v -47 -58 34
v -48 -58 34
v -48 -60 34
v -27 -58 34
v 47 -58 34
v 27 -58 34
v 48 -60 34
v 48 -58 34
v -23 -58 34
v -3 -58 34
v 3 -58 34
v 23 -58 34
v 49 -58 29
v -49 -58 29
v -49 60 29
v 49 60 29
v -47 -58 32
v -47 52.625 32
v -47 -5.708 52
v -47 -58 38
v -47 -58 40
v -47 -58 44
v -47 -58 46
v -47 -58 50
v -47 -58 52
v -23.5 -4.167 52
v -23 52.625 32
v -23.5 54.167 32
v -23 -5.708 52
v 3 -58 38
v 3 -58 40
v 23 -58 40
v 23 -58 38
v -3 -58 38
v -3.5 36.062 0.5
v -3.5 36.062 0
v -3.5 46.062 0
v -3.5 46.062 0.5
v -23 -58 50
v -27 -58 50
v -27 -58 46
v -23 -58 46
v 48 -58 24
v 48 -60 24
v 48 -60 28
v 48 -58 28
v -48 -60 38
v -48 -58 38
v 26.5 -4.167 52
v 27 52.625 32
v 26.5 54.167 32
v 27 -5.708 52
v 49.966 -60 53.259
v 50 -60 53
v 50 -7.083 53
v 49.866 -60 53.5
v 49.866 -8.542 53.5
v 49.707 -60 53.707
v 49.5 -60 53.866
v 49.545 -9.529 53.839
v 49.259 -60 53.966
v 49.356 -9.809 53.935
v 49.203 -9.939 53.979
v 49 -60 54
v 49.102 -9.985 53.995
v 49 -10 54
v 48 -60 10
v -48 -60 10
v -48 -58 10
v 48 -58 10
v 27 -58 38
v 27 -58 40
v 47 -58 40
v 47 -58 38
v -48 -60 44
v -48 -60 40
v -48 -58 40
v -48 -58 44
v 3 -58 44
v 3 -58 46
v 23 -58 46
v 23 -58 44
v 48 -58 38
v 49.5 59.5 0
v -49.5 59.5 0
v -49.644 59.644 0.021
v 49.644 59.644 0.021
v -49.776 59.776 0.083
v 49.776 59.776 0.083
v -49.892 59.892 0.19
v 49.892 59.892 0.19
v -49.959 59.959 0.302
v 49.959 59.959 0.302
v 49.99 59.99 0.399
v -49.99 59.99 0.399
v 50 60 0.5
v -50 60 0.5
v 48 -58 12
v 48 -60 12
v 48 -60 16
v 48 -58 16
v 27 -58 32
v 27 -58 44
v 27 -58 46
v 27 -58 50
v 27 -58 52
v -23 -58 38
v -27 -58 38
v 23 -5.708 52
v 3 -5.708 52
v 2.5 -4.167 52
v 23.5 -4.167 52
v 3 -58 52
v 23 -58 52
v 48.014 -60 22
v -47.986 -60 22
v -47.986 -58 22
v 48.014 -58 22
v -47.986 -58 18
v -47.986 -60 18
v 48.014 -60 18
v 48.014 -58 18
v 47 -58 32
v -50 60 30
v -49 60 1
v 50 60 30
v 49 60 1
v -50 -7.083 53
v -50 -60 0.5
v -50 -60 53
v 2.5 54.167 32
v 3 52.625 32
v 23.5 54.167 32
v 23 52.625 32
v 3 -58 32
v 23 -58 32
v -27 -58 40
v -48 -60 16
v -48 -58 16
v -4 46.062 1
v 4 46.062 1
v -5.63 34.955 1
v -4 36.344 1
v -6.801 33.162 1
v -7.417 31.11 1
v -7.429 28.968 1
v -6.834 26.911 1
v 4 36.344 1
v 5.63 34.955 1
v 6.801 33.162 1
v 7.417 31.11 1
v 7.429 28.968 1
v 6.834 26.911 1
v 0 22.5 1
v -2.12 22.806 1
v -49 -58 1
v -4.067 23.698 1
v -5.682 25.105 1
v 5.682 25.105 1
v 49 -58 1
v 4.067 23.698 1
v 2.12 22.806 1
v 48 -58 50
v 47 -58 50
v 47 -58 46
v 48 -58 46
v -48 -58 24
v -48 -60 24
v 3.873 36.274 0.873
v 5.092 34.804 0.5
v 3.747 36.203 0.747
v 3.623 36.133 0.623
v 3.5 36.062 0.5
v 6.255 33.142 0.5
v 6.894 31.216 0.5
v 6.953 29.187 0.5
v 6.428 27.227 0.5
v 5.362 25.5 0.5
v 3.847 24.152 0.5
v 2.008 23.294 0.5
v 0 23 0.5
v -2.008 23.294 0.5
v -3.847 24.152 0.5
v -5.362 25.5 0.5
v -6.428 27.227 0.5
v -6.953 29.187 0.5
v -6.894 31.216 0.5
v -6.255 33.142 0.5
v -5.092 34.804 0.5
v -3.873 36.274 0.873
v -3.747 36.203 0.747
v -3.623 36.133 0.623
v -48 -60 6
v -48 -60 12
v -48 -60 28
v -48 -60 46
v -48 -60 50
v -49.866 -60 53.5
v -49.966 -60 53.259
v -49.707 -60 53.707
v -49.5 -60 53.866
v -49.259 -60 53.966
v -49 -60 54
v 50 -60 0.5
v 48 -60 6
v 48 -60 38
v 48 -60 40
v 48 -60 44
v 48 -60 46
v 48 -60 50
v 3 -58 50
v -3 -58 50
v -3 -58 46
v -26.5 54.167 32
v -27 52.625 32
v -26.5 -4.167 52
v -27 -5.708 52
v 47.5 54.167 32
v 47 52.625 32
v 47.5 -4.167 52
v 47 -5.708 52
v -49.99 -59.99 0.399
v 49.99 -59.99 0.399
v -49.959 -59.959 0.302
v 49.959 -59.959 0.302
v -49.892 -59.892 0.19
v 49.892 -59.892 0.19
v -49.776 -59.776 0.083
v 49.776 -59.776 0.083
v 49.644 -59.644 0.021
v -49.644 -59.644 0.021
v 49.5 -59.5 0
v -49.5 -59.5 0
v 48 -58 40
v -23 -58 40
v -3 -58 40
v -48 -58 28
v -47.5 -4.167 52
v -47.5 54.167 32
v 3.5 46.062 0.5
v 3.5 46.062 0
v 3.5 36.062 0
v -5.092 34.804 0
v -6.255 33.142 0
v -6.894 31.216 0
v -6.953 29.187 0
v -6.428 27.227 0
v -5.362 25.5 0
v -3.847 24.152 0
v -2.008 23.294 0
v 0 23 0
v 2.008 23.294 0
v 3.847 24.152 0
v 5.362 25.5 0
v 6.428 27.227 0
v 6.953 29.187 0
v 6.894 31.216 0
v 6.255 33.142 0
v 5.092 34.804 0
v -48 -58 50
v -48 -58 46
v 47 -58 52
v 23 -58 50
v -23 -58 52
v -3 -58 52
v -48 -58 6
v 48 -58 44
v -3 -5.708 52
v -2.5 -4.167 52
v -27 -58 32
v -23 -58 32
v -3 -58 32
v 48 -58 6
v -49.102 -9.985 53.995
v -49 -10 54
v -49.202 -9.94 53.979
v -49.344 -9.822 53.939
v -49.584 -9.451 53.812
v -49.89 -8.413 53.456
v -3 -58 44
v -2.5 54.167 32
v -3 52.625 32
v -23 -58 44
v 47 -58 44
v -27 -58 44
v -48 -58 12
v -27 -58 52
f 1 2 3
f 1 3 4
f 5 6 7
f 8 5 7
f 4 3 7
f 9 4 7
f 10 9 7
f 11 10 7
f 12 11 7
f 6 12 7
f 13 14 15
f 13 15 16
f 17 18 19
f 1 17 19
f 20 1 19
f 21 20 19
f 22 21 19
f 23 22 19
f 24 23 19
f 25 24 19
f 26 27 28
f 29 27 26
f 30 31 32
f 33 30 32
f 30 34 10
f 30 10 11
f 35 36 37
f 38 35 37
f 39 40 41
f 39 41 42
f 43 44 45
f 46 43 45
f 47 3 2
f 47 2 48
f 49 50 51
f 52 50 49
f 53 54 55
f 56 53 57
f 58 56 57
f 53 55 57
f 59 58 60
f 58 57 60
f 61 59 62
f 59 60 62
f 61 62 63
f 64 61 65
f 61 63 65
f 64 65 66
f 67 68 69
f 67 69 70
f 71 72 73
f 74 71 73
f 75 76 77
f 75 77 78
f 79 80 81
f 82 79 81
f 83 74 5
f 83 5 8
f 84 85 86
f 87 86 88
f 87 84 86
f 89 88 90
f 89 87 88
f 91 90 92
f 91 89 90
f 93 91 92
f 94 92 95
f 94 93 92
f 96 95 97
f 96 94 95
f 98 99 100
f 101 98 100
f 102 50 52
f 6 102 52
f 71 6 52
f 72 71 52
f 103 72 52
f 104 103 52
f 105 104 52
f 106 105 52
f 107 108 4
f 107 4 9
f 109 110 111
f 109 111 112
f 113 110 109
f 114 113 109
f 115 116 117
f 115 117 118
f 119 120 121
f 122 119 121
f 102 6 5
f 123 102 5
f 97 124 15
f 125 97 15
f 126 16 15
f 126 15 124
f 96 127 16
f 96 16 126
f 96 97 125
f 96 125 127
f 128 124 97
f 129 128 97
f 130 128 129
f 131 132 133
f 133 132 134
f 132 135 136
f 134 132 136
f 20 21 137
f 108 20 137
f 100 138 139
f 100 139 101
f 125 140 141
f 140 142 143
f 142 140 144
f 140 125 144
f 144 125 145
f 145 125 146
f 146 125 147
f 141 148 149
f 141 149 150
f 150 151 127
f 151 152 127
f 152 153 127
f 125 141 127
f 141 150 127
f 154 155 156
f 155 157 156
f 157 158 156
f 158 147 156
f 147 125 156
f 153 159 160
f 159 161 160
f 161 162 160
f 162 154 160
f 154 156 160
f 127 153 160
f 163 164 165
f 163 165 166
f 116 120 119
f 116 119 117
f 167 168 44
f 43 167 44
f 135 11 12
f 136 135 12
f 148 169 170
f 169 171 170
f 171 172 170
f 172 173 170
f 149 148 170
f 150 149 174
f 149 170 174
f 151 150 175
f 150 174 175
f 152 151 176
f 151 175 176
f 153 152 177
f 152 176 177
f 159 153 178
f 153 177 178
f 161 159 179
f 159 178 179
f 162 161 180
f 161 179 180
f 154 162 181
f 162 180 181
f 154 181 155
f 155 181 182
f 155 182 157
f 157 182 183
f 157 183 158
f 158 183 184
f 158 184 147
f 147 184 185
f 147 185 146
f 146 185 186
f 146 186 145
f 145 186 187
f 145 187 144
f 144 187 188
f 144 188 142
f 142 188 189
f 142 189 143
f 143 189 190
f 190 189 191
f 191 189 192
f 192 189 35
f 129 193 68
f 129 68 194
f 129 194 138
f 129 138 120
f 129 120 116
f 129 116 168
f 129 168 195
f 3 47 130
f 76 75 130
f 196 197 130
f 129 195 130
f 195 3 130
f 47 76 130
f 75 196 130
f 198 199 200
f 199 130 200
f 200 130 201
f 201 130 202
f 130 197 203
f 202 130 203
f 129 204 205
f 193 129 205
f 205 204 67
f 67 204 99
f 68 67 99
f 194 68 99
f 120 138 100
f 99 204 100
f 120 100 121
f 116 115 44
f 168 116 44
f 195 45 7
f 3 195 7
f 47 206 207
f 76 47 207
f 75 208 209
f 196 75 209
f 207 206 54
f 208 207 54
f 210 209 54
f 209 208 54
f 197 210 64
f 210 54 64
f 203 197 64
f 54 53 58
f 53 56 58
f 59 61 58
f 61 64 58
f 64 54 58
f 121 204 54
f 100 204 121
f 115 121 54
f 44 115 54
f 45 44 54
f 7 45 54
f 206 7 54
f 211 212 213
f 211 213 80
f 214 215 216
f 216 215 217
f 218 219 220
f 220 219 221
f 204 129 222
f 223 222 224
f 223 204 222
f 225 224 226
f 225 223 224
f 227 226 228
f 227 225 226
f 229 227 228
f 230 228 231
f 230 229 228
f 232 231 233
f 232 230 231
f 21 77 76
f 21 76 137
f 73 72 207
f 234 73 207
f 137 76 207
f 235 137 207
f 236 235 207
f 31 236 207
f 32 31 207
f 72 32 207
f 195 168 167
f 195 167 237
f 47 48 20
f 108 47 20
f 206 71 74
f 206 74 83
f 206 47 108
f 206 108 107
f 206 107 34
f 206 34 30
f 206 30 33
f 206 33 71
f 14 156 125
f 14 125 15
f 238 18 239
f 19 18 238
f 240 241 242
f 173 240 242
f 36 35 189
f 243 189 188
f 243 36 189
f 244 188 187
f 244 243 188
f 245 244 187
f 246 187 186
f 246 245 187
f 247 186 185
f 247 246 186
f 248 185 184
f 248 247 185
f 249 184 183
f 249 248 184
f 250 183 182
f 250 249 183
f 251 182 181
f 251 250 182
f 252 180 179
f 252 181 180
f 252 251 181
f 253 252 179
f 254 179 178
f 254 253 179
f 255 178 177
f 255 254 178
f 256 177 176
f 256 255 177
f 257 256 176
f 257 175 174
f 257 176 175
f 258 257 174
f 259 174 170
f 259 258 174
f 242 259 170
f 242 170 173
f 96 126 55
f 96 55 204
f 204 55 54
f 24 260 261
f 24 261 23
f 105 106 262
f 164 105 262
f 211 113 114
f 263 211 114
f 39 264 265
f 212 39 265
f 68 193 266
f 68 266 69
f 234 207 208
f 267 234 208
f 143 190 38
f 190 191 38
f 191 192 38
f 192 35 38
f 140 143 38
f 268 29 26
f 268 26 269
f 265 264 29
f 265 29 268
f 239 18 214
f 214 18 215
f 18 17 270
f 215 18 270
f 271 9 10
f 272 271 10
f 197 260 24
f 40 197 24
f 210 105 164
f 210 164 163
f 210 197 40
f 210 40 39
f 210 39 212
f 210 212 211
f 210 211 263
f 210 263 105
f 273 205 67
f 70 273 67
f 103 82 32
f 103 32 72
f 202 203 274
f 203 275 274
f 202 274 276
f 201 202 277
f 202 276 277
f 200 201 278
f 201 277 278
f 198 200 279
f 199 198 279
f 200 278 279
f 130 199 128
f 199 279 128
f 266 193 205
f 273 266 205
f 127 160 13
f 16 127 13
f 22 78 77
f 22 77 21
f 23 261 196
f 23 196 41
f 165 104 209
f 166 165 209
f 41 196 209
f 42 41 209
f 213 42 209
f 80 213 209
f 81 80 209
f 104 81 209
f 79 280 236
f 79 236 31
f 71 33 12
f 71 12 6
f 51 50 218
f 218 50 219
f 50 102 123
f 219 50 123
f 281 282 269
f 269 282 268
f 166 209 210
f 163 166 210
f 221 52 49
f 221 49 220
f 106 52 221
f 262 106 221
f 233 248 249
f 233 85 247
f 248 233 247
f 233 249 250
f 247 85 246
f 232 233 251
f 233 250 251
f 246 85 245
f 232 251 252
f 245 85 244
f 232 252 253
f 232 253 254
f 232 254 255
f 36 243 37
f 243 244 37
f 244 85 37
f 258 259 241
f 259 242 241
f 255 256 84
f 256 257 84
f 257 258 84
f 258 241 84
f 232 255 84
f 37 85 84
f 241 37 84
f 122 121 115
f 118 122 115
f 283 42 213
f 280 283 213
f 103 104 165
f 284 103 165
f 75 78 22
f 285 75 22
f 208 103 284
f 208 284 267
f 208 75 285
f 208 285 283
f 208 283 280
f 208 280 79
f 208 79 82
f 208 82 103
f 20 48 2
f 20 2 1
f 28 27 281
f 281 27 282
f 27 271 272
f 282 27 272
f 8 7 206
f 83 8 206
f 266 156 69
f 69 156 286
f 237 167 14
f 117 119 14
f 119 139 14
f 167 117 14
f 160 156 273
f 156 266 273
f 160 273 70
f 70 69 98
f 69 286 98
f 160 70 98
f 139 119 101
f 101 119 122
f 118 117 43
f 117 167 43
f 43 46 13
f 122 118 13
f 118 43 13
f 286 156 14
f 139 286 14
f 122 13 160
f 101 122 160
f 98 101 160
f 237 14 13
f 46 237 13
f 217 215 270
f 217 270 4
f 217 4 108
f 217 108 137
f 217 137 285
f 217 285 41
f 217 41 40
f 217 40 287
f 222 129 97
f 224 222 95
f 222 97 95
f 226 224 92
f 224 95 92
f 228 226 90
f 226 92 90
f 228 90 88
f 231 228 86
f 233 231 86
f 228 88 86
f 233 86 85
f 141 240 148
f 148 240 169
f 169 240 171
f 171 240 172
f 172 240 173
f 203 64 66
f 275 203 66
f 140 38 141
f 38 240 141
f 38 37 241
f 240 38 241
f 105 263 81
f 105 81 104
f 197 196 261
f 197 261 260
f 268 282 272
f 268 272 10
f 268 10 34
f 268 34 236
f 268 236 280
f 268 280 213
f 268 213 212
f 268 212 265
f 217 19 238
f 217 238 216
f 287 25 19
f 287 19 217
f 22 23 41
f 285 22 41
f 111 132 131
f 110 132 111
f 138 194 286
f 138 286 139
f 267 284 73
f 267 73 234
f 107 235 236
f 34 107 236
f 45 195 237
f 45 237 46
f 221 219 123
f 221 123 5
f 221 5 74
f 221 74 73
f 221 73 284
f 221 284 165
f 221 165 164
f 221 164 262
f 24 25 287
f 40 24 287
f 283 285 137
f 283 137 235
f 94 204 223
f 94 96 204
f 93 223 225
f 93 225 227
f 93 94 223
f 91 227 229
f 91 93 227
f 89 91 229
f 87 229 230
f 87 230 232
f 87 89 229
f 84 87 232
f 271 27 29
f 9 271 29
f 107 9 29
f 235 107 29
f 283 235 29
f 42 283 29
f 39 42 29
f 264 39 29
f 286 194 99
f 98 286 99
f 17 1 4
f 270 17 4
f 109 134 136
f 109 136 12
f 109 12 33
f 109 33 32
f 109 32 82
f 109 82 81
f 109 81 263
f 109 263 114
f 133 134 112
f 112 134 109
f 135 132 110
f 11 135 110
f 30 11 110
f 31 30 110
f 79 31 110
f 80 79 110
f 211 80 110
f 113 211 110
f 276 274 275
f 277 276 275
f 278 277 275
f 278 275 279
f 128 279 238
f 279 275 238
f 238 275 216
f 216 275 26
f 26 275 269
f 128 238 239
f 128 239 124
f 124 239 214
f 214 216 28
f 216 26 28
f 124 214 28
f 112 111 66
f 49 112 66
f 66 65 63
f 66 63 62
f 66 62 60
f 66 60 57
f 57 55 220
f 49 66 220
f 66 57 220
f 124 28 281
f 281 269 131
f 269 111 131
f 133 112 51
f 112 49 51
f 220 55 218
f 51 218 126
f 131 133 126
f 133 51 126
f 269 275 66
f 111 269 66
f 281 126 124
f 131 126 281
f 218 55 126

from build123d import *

# Parameters (mm, degrees)
SKETCH_W        = 100
SKETCH_H        = 120
PAD_DEPTH       = 30
SKETCH001_W     = 98
SKETCH001_H     = 28
POCKET_DEPTH    = 118
POCKET006_DEPTH = 2
PAD001_DEPTH    = 100
SKETCH012_W     = 20
SKETCH012_H     = 20
POCKET011_DEPTH = 118
SKETCH016_W     = 96
SKETCH016_H     = 4
POCKET012_DEPTH = 2
SKETCH014_W     = 96
SKETCH014_H     = 4
POCKET013_DEPTH = 2
SKETCH013_W     = 96
SKETCH013_H     = 4
POCKET014_DEPTH = 2
SKETCH009_W     = 96
SKETCH009_H     = 4
POCKET015_DEPTH = 2
SKETCH003_W     = 96
SKETCH003_H     = 4
POCKET016_DEPTH = 2
SKETCH007_W     = 96
SKETCH007_H     = 4
POCKET017_DEPTH = 2
SKETCH008_W     = 96
SKETCH008_H     = 4
POCKET018_DEPTH = 2
FILLET_R        = 0.5
FILLET001_R     = 1
FILLET002_R     = 1
CHAMFER_SIZE    = 0.5
CHAMFER001_SIZE = 0.5


with BuildPart() as part:
    # Sketch → Pad (new body)
    with BuildSketch(Plane.XY):
        Rectangle(SKETCH_W, SKETCH_H)
    extrude(amount=PAD_DEPTH)

    # Sketch001 → Pocket (cut)
    with BuildSketch(Plane.XZ.offset(58)):
        with Locations((0, 15)):
            Rectangle(SKETCH001_W, SKETCH001_H)
    extrude(amount=-POCKET_DEPTH, mode=Mode.SUBTRACT)

    # Sketch010 → Pocket006 (cut)
    with BuildSketch(Plane.XY):
        with BuildLine():
            Line((-3.5, 46.062178), (3.5, 46.062178))
            Line((3.5, 46.062178), (3.5, 36.062178))
            ThreePointArc((-3.5, 36.062178), (0, 23), (3.5, 36.062178))
            Line((-3.5, 36.062178), (-3.5, 46.062178))
        make_face()
    extrude(amount=POCKET006_DEPTH, mode=Mode.SUBTRACT)

    # Sketch011 → Pad001 (join)
    with BuildSketch(Plane.YZ.offset(50)):
        Polygon((60, 30), (-60, 30), (-60, 54), (-10, 54), align=None)
    extrude(amount=-PAD001_DEPTH)

    # Sketch012 → Pocket011 (cut)
    with BuildSketch(Plane.XZ.offset(58)):
        with Locations((37, 42)):
            Rectangle(SKETCH012_W, SKETCH012_H)
        with Locations((13, 42)):
            Rectangle(SKETCH012_W, SKETCH012_H)
        with Locations((-13, 42)):
            Rectangle(SKETCH012_W, SKETCH012_H)
        with Locations((-37, 42)):
            Rectangle(SKETCH012_W, SKETCH012_H)
    extrude(amount=-POCKET011_DEPTH, mode=Mode.SUBTRACT)

    # Sketch016 → Pocket012 (cut)
    with BuildSketch(Plane.XZ.offset(60)):
        with Locations((0, 48)):
            Rectangle(SKETCH016_W, SKETCH016_H)
    extrude(amount=-POCKET012_DEPTH, mode=Mode.SUBTRACT)

    # Sketch014 → Pocket013 (cut)
    with BuildSketch(Plane.XZ.offset(60)):
        with Locations((0, 42)):
            Rectangle(SKETCH014_W, SKETCH014_H)
    extrude(amount=-POCKET013_DEPTH, mode=Mode.SUBTRACT)

    # Sketch013 → Pocket014 (cut)
    with BuildSketch(Plane.XZ.offset(60)):
        with Locations((0, 36)):
            Rectangle(SKETCH013_W, SKETCH013_H)
    extrude(amount=-POCKET014_DEPTH, mode=Mode.SUBTRACT)

    # Sketch009 → Pocket015 (cut)
    with BuildSketch(Plane.XZ.offset(60)):
        with Locations((0, 26)):
            Rectangle(SKETCH009_W, SKETCH009_H)
    extrude(amount=-POCKET015_DEPTH, mode=Mode.SUBTRACT)

    # Sketch003 → Pocket016 (cut)
    with BuildSketch(Plane.XZ.offset(60)):
        with Locations((0.01379, 20)):
            Rectangle(SKETCH003_W, SKETCH003_H)
    extrude(amount=-POCKET016_DEPTH, mode=Mode.SUBTRACT)

    # Sketch007 → Pocket017 (cut)
    with BuildSketch(Plane.XZ.offset(60)):
        with Locations((0, 14)):
            Rectangle(SKETCH007_W, SKETCH007_H)
    extrude(amount=-POCKET017_DEPTH, mode=Mode.SUBTRACT)

    # Sketch008 → Pocket018 (cut)
    with BuildSketch(Plane.XZ.offset(60)):
        with Locations((0, 8)):
            Rectangle(SKETCH008_W, SKETCH008_H)
    extrude(amount=-POCKET018_DEPTH, mode=Mode.SUBTRACT)

    # Fillet
    fillet_edges = [part.edges().sort_by_distance(p)[0] for p in [
        (0, -60, 0),
        (-50, 0, 0),
        (50, 0, 0),
        (0, 60, 0),
    ]]
    fillet(fillet_edges, radius=FILLET_R)

    # Fillet001
    fillet001_edges = [part.edges().sort_by_distance(p)[0] for p in [
        (50, -35, 54),
    ]]
    fillet(fillet001_edges, radius=FILLET001_R)

    # Fillet002
    fillet002_edges = [part.edges().sort_by_distance(p)[0] for p in [
        (-50, -35, 54),
    ]]
    fillet(fillet002_edges, radius=FILLET002_R)

    # Chamfer
    chamfer_edges = [part.edges().sort_by_distance(p)[0] for p in [
        (47, 25, 42),
        (27, 25, 42),
        (23, 25, 42),
        (3, 25, 42),
        (-3, 25, 42),
        (-23, 25, 42),
        (-27, 25, 42),
        (-47, 25, 42),
    ]]
    chamfer(chamfer_edges, length=CHAMFER_SIZE)

    # Chamfer001
    chamfer001_edges = [part.edges().sort_by_distance(p)[0] for p in [
        (3.5, 41.062178, 1),
        (0, 23, 1),
        (-3.5, 41.062178, 1),
    ]]
    chamfer(chamfer001_edges, length=CHAMFER001_SIZE)


solid = part.part
